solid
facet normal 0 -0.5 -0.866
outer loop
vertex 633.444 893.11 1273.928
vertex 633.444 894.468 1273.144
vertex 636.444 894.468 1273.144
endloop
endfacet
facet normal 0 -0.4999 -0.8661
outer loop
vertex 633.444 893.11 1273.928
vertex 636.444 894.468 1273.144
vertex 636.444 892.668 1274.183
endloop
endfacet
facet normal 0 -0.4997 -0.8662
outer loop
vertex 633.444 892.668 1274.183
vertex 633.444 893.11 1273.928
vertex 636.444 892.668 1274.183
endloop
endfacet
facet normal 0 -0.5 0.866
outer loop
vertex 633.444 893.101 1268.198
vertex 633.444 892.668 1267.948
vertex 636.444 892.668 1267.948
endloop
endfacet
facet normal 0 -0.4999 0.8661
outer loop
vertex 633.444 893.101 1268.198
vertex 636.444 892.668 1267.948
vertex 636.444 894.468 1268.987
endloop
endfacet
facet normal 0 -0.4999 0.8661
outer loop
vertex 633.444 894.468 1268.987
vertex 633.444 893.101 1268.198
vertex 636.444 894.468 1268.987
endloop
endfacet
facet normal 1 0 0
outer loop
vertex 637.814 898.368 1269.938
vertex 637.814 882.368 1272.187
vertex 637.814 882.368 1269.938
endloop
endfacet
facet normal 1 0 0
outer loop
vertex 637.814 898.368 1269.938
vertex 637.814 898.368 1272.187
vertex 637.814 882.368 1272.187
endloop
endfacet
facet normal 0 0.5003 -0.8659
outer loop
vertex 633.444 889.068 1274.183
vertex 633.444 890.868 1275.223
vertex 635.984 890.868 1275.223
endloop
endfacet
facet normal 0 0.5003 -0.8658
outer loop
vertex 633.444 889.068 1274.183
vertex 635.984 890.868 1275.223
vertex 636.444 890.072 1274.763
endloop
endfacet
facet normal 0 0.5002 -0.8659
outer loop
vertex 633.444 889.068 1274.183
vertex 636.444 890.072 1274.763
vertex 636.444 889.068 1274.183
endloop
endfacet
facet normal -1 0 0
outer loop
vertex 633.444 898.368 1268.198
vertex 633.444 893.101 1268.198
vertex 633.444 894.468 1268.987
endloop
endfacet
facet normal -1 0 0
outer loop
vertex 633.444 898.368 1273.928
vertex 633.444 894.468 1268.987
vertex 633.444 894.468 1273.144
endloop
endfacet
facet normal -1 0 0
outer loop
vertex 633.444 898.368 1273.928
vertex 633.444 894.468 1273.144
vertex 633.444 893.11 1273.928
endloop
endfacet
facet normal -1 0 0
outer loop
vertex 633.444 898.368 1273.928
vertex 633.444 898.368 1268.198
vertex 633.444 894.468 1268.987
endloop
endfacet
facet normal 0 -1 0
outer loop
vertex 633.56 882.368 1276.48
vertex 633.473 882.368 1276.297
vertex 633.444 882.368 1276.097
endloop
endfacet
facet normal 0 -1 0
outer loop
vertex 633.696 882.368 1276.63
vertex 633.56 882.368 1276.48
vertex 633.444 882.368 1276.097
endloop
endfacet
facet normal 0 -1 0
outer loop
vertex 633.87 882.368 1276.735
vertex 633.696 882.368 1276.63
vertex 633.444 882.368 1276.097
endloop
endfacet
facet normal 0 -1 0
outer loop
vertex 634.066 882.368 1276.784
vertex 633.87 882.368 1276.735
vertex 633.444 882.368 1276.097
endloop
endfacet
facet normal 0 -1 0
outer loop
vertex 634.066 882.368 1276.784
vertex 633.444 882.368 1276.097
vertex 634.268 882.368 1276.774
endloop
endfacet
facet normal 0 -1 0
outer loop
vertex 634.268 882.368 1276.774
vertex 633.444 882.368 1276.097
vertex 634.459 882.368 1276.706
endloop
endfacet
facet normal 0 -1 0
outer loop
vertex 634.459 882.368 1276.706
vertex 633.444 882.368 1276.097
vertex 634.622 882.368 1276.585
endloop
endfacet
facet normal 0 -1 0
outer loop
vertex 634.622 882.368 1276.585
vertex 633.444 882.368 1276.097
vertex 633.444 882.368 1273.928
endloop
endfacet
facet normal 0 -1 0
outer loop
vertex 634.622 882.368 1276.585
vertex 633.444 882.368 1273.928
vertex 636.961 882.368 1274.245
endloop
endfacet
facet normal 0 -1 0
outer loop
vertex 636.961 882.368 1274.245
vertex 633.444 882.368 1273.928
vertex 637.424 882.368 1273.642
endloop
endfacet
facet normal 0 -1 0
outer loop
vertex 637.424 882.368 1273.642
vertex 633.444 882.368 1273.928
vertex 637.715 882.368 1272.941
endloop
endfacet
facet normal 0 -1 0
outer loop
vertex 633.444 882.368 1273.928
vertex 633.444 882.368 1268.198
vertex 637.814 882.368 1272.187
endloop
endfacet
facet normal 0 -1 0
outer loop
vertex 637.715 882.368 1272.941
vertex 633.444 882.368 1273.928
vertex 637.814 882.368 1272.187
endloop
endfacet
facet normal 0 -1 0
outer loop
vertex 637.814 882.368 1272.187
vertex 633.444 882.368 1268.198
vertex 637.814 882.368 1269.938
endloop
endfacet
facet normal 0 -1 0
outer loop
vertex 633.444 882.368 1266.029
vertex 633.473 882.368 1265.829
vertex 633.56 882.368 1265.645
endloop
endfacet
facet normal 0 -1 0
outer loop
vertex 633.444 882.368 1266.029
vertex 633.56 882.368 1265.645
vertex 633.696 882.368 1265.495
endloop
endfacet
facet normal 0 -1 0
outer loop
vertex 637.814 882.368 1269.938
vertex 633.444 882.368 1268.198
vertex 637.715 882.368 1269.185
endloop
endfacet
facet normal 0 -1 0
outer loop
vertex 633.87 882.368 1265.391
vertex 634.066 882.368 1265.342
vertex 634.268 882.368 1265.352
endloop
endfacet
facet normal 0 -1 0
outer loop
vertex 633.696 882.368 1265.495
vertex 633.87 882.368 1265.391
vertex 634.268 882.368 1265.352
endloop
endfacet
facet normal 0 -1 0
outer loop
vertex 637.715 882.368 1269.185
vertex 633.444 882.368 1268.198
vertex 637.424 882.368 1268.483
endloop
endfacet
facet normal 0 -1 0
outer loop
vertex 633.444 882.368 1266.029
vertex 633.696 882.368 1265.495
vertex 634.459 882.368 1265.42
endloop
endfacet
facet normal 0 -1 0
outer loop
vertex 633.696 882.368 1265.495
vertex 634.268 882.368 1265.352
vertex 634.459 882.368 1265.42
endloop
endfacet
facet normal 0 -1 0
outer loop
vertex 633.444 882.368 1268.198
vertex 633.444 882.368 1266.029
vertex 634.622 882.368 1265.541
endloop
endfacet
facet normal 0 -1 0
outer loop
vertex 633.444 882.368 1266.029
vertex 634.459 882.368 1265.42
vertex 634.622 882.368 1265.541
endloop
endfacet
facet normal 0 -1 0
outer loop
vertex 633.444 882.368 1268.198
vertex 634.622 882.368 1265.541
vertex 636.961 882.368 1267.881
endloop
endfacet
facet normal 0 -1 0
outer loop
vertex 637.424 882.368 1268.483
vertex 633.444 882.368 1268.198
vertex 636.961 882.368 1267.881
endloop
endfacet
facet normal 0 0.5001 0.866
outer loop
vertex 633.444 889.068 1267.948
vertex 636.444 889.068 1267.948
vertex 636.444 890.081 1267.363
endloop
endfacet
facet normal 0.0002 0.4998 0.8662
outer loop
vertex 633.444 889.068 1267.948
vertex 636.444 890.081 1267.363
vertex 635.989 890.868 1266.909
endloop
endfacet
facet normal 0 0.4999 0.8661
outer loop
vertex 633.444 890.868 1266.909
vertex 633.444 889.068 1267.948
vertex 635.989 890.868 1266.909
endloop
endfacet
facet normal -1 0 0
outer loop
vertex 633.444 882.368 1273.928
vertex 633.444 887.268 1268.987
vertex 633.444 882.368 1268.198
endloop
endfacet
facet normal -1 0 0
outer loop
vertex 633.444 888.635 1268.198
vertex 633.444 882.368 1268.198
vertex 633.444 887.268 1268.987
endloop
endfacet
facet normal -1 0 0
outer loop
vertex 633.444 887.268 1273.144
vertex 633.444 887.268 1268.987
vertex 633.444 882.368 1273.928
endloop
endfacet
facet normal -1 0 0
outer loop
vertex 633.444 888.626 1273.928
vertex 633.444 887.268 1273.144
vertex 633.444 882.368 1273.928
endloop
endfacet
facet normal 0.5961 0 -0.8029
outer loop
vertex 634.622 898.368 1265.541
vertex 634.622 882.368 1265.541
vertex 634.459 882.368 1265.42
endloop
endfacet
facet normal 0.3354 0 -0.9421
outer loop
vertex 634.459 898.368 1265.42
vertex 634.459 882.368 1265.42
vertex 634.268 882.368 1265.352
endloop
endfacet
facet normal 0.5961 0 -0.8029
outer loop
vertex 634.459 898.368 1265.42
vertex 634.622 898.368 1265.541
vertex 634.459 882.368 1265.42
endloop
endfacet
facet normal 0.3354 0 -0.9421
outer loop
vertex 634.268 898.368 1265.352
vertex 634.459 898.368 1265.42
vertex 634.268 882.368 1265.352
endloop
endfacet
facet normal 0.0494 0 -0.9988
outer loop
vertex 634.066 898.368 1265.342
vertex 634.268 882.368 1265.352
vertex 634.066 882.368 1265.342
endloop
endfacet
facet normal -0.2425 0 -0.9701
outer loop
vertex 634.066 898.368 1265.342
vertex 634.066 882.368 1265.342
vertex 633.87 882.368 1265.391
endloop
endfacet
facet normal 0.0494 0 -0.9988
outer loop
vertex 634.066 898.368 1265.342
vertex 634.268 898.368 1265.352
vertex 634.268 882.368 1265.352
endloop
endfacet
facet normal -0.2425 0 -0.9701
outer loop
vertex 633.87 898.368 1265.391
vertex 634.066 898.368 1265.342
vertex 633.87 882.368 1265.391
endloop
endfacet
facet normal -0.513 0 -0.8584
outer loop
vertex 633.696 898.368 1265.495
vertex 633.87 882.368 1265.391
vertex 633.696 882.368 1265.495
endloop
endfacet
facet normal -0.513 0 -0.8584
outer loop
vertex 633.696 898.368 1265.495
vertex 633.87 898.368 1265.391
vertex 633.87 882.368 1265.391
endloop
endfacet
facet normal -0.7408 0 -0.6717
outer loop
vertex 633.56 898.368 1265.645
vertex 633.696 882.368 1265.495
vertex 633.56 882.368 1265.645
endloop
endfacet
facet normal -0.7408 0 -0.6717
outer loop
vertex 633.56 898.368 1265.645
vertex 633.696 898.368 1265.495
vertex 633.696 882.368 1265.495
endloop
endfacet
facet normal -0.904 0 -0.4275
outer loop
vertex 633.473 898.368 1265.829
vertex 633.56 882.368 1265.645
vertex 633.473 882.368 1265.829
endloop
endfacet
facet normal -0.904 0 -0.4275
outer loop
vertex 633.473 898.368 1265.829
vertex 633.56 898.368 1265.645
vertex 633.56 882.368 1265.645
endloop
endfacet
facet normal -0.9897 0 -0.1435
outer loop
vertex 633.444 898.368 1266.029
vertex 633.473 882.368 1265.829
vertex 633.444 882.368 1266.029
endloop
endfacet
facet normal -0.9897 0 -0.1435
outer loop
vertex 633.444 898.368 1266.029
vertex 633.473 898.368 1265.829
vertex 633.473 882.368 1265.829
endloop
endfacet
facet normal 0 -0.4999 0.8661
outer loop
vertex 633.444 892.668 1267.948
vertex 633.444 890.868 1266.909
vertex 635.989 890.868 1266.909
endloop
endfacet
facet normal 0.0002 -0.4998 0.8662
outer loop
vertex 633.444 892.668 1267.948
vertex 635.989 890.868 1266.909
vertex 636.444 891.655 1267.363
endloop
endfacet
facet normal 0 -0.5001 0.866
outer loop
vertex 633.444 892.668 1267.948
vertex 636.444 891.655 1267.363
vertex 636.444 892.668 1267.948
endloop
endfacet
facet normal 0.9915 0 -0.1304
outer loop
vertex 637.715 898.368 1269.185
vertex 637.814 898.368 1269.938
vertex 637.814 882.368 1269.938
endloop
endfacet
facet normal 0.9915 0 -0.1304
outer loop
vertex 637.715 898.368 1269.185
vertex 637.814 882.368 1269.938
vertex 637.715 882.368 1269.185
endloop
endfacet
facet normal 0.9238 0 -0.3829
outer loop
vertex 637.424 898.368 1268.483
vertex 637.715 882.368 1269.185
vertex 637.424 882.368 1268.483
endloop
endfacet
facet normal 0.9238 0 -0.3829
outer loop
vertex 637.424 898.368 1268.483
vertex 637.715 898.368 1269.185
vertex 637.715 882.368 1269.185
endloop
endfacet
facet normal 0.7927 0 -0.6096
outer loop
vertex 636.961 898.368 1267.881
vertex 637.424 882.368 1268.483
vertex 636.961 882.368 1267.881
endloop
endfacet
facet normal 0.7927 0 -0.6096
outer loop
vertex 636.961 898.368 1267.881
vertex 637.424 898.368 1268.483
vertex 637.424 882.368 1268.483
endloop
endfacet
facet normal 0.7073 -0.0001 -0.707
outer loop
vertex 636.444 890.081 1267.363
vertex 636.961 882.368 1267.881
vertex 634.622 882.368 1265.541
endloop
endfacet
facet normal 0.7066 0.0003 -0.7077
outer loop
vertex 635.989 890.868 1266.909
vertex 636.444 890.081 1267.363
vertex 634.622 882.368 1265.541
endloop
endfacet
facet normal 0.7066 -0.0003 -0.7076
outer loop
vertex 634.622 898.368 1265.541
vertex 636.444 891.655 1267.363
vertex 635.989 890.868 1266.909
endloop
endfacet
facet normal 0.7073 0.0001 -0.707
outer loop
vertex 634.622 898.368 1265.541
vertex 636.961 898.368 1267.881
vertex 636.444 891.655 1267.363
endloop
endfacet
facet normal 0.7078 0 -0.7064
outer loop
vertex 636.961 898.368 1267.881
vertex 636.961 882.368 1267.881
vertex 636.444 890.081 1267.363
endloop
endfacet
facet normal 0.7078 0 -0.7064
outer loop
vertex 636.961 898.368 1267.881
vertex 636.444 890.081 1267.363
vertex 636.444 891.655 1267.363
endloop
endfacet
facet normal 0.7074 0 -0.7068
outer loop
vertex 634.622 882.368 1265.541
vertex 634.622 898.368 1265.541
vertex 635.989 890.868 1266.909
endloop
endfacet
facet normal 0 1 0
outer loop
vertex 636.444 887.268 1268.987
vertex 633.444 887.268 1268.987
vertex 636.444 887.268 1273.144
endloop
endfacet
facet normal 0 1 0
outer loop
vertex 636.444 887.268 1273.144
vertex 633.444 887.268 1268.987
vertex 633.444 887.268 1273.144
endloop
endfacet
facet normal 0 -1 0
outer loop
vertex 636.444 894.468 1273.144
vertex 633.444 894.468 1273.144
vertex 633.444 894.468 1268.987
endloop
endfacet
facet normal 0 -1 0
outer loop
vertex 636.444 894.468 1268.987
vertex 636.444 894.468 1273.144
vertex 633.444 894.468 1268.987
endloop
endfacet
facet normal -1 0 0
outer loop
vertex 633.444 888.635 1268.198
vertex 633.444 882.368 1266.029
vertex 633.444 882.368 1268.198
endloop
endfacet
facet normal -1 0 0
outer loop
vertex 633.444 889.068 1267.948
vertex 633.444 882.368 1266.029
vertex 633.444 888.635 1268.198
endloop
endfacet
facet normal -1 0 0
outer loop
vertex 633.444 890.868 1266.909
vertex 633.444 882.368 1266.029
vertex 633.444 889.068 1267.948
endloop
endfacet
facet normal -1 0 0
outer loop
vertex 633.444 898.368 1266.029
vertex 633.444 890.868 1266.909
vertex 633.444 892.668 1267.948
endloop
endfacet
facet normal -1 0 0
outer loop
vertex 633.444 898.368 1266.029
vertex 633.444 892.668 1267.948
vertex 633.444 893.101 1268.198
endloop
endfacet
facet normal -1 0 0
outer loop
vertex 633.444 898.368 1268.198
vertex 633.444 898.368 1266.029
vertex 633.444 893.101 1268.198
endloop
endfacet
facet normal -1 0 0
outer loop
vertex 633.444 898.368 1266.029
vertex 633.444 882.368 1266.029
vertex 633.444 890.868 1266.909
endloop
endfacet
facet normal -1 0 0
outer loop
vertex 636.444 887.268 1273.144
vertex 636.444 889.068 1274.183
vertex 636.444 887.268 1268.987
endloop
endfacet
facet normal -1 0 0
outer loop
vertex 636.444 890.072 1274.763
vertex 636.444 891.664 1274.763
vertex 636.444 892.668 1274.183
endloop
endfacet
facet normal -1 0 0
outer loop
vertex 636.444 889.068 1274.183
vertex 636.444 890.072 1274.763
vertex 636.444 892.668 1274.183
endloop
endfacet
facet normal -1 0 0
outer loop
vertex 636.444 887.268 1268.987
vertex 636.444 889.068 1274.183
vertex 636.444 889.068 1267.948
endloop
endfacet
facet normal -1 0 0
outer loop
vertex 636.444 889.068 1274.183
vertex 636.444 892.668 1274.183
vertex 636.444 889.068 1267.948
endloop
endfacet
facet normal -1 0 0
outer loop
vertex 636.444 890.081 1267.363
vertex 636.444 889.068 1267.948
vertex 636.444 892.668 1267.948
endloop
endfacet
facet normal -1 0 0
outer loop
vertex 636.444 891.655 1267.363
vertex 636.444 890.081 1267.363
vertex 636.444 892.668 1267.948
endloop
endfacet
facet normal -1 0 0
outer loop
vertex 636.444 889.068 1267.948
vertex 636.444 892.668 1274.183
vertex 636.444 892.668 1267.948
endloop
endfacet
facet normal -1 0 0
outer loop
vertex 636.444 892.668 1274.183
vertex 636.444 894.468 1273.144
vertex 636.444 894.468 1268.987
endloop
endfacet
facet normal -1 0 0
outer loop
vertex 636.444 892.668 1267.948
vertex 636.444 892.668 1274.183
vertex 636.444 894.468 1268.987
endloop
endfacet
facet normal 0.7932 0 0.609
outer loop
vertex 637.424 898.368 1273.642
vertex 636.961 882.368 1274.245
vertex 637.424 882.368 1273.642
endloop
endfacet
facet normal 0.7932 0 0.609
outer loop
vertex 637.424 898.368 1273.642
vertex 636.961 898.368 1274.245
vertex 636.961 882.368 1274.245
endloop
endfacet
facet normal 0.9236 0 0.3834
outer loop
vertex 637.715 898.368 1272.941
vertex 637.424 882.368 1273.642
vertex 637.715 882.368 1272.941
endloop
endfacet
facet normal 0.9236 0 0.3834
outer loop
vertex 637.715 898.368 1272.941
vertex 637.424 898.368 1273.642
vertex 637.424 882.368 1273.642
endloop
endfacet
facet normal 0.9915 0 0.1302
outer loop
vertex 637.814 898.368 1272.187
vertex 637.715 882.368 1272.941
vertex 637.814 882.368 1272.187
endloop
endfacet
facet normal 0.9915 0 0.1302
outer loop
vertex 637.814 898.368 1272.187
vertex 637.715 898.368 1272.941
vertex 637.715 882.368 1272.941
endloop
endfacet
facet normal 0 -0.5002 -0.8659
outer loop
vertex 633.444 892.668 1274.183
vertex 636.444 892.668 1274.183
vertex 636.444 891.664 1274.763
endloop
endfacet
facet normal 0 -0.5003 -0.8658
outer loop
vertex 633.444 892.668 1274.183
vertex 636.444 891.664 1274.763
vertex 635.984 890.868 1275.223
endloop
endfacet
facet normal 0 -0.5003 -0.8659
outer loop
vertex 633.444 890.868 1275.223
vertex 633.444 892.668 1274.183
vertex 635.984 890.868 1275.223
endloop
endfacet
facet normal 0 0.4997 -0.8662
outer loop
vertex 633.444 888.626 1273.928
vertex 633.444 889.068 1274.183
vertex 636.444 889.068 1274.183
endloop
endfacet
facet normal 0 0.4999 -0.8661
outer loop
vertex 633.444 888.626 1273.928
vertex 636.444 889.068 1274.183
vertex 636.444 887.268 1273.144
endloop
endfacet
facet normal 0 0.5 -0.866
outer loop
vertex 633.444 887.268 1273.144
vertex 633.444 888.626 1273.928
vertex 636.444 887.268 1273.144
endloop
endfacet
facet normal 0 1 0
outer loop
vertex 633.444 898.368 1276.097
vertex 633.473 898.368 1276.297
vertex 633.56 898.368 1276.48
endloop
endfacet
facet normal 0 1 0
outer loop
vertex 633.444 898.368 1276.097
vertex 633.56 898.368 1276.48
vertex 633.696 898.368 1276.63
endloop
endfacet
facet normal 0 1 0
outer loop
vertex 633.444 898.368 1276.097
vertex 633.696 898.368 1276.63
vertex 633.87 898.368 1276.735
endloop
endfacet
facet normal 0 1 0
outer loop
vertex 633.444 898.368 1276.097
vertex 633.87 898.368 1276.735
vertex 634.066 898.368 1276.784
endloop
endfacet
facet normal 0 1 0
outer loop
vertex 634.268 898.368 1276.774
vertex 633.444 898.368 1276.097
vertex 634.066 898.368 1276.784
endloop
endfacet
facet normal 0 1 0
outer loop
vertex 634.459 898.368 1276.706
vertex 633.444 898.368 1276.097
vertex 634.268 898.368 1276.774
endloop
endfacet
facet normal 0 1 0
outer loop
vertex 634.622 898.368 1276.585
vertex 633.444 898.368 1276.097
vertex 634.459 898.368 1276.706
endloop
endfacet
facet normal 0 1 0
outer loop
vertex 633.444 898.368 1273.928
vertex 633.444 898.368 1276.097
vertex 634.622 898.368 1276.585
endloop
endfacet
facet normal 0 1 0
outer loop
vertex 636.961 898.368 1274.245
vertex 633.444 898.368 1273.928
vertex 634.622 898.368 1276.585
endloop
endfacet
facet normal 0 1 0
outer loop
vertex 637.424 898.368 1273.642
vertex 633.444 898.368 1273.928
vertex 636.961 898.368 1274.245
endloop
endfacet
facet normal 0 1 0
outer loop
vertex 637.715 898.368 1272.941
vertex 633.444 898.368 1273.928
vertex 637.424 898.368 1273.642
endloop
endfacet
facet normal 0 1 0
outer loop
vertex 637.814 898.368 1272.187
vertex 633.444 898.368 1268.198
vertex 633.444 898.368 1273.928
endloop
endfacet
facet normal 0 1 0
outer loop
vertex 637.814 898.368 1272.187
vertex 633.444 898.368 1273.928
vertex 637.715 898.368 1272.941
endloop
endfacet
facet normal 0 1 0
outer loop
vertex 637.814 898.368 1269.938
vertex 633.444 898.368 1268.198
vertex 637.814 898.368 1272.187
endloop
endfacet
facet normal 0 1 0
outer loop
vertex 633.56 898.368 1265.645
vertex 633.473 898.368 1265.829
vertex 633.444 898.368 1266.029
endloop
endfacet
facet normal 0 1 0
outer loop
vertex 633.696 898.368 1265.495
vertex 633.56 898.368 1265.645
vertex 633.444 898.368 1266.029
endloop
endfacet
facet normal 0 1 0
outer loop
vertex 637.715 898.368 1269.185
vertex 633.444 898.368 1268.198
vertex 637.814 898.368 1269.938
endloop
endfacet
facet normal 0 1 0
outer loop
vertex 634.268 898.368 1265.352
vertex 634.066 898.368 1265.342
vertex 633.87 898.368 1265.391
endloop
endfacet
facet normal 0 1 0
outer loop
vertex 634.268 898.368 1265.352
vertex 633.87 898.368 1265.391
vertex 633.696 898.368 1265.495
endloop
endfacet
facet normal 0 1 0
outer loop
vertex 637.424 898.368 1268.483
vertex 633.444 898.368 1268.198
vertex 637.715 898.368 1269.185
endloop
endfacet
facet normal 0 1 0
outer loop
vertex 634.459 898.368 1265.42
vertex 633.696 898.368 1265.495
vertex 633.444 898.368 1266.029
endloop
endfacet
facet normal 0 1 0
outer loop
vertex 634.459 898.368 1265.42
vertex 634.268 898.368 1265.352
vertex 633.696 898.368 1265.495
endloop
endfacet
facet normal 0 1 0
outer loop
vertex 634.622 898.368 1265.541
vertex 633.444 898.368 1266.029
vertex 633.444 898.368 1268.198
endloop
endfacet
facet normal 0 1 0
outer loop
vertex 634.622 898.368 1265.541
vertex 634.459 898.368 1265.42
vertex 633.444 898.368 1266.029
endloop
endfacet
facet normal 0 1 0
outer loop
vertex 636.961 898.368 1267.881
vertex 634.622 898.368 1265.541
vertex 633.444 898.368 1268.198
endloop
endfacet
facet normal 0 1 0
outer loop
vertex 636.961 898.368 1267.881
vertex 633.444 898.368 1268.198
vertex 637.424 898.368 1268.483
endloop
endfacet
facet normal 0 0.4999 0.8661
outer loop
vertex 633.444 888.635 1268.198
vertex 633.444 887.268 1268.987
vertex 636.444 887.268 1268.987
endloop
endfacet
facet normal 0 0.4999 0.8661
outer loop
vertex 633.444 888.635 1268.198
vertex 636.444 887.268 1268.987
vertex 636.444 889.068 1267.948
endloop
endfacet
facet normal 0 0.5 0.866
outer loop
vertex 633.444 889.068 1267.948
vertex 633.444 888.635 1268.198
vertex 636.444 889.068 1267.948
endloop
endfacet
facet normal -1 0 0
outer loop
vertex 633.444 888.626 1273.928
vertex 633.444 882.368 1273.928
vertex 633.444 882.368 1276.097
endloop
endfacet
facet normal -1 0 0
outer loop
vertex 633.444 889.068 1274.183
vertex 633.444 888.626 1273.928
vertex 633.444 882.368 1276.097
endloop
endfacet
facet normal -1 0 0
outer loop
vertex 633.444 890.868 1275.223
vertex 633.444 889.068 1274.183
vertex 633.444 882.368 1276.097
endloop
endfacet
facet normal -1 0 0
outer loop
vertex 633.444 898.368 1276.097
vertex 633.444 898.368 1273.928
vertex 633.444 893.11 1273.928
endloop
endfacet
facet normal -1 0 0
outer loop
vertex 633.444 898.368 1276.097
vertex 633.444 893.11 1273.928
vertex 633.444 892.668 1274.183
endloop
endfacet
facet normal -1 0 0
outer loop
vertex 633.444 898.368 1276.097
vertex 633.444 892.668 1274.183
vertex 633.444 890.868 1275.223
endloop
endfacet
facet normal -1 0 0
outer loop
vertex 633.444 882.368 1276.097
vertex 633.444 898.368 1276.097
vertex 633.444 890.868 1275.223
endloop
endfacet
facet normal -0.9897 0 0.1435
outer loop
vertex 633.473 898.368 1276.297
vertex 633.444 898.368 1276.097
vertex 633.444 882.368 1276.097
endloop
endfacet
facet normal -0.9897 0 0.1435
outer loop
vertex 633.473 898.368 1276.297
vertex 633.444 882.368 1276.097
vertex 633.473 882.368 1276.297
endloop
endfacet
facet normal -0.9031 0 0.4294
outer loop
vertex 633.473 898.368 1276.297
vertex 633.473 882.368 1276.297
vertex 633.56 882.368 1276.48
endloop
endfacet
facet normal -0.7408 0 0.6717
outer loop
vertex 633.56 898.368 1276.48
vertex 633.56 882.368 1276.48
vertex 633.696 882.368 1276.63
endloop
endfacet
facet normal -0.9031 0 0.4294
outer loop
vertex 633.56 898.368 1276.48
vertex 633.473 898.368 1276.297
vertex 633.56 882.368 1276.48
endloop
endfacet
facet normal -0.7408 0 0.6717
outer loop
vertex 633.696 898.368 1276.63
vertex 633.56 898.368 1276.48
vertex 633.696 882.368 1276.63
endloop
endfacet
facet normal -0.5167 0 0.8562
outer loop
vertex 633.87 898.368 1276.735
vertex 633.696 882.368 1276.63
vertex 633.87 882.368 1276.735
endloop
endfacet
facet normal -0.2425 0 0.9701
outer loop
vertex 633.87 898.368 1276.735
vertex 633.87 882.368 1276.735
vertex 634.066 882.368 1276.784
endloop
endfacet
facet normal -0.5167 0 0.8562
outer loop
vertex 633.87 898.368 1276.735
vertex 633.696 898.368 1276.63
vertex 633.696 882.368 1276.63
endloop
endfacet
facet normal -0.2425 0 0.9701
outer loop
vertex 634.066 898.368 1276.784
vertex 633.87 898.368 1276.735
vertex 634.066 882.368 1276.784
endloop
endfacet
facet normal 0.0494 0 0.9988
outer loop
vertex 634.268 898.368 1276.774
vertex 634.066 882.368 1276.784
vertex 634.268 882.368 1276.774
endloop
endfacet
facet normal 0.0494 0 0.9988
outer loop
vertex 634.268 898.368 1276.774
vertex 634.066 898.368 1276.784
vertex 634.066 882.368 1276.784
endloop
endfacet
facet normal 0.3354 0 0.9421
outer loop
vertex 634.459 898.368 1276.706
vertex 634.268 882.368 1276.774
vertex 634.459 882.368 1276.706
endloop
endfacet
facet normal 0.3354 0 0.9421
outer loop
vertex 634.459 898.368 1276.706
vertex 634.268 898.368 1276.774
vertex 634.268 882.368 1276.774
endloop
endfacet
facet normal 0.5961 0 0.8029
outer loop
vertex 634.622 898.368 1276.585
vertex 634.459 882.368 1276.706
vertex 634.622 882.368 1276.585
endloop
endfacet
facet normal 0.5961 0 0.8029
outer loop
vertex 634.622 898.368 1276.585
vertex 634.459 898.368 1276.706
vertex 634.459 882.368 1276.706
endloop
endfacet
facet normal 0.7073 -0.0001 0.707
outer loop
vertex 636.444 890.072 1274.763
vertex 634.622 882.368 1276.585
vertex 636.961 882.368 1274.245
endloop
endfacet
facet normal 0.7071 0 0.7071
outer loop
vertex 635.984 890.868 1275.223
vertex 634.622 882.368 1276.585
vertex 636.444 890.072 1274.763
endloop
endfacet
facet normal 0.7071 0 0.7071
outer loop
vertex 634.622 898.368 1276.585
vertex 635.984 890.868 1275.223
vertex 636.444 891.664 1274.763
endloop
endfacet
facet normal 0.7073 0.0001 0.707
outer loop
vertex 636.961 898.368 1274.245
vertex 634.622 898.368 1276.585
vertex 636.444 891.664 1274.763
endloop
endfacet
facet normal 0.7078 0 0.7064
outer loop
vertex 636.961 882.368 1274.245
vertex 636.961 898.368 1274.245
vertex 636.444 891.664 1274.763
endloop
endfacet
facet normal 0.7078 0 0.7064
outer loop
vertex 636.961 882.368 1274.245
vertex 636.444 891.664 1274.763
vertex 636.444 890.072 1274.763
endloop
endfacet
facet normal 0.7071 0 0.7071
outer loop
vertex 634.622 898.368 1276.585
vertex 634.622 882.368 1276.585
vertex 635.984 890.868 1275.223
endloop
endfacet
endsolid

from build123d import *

# Parameters (mm, degrees)
BOSS_EXTRUDE1_START = 3
BOSS_EXTRUDE1_DEPTH = 8
CUT_EXTRUDE1_DEPTH  = 3


with BuildPart() as part:
    # Sketch1 → Boss-Extrude1 (new, symmetric)
    with BuildSketch(Plane(origin=(0, 887.368143731, 0), x_dir=(1, 0, 0), z_dir=(0, 1, 0)).offset(BOSS_EXTRUDE1_START)):
        with BuildLine():
            Line((637.813700875, -1272.18749392), (637.81370087, -1269.938359702))
            ThreePointArc((637.81370087, -1269.938359702), (637.592190309, -1268.824750917), (636.961381603, -1267.880678974))
            Line((636.961381603, -1267.880678974), (634.621604573, -1265.540901944))
            ThreePointArc((634.621604573, -1265.540901944), (633.86964944, -1265.391328698), (633.443700894, -1266.028805374))
            Line((633.443700894, -1266.028805374), (633.443700112, -1268.19792696))
            Line((633.443700112, -1268.19792696), (633.443700112, -1273.927926678))
            Line((633.443700112, -1273.927926678), (633.4437009, -1276.09704826))
            ThreePointArc((633.4437009, -1276.09704826), (633.869649447, -1276.734524935), (634.621604579, -1276.584951689))
            Line((634.621604579, -1276.584951689), (636.961381608, -1274.245174659))
            ThreePointArc((636.961381608, -1274.245174659), (637.592190316, -1273.301102712), (637.813700875, -1272.18749392))
        make_face()
    extrude(amount=BOSS_EXTRUDE1_DEPTH, both=True)

    # Sketch2 → Cut-Extrude1 (cut)
    with BuildSketch(Plane(origin=(633.443237581, 0, -0.000229987), x_dir=(3.630749913810974e-07, 0, 0.9999999999999342), z_dir=(-0.9999999999999342, 0, 3.630749913810974e-07))):
        Polygon((1268.987365094, 887.268143731), (1267.948134548, 889.068143719), (1266.908904124, 890.868143731), (1267.948134534, 892.668143718), (1268.987365094, 894.468143731), (1271.065825986, 894.468143731), (1273.144287032, 894.468143731), (1274.18351745, 892.668143728), (1275.222748001, 890.868143731), (1274.183517448, 889.068143728), (1273.144287032, 887.268143731), (1271.065825995, 887.268143731), align=None)
    extrude(amount=-CUT_EXTRUDE1_DEPTH, mode=Mode.SUBTRACT)


solid = part.part
